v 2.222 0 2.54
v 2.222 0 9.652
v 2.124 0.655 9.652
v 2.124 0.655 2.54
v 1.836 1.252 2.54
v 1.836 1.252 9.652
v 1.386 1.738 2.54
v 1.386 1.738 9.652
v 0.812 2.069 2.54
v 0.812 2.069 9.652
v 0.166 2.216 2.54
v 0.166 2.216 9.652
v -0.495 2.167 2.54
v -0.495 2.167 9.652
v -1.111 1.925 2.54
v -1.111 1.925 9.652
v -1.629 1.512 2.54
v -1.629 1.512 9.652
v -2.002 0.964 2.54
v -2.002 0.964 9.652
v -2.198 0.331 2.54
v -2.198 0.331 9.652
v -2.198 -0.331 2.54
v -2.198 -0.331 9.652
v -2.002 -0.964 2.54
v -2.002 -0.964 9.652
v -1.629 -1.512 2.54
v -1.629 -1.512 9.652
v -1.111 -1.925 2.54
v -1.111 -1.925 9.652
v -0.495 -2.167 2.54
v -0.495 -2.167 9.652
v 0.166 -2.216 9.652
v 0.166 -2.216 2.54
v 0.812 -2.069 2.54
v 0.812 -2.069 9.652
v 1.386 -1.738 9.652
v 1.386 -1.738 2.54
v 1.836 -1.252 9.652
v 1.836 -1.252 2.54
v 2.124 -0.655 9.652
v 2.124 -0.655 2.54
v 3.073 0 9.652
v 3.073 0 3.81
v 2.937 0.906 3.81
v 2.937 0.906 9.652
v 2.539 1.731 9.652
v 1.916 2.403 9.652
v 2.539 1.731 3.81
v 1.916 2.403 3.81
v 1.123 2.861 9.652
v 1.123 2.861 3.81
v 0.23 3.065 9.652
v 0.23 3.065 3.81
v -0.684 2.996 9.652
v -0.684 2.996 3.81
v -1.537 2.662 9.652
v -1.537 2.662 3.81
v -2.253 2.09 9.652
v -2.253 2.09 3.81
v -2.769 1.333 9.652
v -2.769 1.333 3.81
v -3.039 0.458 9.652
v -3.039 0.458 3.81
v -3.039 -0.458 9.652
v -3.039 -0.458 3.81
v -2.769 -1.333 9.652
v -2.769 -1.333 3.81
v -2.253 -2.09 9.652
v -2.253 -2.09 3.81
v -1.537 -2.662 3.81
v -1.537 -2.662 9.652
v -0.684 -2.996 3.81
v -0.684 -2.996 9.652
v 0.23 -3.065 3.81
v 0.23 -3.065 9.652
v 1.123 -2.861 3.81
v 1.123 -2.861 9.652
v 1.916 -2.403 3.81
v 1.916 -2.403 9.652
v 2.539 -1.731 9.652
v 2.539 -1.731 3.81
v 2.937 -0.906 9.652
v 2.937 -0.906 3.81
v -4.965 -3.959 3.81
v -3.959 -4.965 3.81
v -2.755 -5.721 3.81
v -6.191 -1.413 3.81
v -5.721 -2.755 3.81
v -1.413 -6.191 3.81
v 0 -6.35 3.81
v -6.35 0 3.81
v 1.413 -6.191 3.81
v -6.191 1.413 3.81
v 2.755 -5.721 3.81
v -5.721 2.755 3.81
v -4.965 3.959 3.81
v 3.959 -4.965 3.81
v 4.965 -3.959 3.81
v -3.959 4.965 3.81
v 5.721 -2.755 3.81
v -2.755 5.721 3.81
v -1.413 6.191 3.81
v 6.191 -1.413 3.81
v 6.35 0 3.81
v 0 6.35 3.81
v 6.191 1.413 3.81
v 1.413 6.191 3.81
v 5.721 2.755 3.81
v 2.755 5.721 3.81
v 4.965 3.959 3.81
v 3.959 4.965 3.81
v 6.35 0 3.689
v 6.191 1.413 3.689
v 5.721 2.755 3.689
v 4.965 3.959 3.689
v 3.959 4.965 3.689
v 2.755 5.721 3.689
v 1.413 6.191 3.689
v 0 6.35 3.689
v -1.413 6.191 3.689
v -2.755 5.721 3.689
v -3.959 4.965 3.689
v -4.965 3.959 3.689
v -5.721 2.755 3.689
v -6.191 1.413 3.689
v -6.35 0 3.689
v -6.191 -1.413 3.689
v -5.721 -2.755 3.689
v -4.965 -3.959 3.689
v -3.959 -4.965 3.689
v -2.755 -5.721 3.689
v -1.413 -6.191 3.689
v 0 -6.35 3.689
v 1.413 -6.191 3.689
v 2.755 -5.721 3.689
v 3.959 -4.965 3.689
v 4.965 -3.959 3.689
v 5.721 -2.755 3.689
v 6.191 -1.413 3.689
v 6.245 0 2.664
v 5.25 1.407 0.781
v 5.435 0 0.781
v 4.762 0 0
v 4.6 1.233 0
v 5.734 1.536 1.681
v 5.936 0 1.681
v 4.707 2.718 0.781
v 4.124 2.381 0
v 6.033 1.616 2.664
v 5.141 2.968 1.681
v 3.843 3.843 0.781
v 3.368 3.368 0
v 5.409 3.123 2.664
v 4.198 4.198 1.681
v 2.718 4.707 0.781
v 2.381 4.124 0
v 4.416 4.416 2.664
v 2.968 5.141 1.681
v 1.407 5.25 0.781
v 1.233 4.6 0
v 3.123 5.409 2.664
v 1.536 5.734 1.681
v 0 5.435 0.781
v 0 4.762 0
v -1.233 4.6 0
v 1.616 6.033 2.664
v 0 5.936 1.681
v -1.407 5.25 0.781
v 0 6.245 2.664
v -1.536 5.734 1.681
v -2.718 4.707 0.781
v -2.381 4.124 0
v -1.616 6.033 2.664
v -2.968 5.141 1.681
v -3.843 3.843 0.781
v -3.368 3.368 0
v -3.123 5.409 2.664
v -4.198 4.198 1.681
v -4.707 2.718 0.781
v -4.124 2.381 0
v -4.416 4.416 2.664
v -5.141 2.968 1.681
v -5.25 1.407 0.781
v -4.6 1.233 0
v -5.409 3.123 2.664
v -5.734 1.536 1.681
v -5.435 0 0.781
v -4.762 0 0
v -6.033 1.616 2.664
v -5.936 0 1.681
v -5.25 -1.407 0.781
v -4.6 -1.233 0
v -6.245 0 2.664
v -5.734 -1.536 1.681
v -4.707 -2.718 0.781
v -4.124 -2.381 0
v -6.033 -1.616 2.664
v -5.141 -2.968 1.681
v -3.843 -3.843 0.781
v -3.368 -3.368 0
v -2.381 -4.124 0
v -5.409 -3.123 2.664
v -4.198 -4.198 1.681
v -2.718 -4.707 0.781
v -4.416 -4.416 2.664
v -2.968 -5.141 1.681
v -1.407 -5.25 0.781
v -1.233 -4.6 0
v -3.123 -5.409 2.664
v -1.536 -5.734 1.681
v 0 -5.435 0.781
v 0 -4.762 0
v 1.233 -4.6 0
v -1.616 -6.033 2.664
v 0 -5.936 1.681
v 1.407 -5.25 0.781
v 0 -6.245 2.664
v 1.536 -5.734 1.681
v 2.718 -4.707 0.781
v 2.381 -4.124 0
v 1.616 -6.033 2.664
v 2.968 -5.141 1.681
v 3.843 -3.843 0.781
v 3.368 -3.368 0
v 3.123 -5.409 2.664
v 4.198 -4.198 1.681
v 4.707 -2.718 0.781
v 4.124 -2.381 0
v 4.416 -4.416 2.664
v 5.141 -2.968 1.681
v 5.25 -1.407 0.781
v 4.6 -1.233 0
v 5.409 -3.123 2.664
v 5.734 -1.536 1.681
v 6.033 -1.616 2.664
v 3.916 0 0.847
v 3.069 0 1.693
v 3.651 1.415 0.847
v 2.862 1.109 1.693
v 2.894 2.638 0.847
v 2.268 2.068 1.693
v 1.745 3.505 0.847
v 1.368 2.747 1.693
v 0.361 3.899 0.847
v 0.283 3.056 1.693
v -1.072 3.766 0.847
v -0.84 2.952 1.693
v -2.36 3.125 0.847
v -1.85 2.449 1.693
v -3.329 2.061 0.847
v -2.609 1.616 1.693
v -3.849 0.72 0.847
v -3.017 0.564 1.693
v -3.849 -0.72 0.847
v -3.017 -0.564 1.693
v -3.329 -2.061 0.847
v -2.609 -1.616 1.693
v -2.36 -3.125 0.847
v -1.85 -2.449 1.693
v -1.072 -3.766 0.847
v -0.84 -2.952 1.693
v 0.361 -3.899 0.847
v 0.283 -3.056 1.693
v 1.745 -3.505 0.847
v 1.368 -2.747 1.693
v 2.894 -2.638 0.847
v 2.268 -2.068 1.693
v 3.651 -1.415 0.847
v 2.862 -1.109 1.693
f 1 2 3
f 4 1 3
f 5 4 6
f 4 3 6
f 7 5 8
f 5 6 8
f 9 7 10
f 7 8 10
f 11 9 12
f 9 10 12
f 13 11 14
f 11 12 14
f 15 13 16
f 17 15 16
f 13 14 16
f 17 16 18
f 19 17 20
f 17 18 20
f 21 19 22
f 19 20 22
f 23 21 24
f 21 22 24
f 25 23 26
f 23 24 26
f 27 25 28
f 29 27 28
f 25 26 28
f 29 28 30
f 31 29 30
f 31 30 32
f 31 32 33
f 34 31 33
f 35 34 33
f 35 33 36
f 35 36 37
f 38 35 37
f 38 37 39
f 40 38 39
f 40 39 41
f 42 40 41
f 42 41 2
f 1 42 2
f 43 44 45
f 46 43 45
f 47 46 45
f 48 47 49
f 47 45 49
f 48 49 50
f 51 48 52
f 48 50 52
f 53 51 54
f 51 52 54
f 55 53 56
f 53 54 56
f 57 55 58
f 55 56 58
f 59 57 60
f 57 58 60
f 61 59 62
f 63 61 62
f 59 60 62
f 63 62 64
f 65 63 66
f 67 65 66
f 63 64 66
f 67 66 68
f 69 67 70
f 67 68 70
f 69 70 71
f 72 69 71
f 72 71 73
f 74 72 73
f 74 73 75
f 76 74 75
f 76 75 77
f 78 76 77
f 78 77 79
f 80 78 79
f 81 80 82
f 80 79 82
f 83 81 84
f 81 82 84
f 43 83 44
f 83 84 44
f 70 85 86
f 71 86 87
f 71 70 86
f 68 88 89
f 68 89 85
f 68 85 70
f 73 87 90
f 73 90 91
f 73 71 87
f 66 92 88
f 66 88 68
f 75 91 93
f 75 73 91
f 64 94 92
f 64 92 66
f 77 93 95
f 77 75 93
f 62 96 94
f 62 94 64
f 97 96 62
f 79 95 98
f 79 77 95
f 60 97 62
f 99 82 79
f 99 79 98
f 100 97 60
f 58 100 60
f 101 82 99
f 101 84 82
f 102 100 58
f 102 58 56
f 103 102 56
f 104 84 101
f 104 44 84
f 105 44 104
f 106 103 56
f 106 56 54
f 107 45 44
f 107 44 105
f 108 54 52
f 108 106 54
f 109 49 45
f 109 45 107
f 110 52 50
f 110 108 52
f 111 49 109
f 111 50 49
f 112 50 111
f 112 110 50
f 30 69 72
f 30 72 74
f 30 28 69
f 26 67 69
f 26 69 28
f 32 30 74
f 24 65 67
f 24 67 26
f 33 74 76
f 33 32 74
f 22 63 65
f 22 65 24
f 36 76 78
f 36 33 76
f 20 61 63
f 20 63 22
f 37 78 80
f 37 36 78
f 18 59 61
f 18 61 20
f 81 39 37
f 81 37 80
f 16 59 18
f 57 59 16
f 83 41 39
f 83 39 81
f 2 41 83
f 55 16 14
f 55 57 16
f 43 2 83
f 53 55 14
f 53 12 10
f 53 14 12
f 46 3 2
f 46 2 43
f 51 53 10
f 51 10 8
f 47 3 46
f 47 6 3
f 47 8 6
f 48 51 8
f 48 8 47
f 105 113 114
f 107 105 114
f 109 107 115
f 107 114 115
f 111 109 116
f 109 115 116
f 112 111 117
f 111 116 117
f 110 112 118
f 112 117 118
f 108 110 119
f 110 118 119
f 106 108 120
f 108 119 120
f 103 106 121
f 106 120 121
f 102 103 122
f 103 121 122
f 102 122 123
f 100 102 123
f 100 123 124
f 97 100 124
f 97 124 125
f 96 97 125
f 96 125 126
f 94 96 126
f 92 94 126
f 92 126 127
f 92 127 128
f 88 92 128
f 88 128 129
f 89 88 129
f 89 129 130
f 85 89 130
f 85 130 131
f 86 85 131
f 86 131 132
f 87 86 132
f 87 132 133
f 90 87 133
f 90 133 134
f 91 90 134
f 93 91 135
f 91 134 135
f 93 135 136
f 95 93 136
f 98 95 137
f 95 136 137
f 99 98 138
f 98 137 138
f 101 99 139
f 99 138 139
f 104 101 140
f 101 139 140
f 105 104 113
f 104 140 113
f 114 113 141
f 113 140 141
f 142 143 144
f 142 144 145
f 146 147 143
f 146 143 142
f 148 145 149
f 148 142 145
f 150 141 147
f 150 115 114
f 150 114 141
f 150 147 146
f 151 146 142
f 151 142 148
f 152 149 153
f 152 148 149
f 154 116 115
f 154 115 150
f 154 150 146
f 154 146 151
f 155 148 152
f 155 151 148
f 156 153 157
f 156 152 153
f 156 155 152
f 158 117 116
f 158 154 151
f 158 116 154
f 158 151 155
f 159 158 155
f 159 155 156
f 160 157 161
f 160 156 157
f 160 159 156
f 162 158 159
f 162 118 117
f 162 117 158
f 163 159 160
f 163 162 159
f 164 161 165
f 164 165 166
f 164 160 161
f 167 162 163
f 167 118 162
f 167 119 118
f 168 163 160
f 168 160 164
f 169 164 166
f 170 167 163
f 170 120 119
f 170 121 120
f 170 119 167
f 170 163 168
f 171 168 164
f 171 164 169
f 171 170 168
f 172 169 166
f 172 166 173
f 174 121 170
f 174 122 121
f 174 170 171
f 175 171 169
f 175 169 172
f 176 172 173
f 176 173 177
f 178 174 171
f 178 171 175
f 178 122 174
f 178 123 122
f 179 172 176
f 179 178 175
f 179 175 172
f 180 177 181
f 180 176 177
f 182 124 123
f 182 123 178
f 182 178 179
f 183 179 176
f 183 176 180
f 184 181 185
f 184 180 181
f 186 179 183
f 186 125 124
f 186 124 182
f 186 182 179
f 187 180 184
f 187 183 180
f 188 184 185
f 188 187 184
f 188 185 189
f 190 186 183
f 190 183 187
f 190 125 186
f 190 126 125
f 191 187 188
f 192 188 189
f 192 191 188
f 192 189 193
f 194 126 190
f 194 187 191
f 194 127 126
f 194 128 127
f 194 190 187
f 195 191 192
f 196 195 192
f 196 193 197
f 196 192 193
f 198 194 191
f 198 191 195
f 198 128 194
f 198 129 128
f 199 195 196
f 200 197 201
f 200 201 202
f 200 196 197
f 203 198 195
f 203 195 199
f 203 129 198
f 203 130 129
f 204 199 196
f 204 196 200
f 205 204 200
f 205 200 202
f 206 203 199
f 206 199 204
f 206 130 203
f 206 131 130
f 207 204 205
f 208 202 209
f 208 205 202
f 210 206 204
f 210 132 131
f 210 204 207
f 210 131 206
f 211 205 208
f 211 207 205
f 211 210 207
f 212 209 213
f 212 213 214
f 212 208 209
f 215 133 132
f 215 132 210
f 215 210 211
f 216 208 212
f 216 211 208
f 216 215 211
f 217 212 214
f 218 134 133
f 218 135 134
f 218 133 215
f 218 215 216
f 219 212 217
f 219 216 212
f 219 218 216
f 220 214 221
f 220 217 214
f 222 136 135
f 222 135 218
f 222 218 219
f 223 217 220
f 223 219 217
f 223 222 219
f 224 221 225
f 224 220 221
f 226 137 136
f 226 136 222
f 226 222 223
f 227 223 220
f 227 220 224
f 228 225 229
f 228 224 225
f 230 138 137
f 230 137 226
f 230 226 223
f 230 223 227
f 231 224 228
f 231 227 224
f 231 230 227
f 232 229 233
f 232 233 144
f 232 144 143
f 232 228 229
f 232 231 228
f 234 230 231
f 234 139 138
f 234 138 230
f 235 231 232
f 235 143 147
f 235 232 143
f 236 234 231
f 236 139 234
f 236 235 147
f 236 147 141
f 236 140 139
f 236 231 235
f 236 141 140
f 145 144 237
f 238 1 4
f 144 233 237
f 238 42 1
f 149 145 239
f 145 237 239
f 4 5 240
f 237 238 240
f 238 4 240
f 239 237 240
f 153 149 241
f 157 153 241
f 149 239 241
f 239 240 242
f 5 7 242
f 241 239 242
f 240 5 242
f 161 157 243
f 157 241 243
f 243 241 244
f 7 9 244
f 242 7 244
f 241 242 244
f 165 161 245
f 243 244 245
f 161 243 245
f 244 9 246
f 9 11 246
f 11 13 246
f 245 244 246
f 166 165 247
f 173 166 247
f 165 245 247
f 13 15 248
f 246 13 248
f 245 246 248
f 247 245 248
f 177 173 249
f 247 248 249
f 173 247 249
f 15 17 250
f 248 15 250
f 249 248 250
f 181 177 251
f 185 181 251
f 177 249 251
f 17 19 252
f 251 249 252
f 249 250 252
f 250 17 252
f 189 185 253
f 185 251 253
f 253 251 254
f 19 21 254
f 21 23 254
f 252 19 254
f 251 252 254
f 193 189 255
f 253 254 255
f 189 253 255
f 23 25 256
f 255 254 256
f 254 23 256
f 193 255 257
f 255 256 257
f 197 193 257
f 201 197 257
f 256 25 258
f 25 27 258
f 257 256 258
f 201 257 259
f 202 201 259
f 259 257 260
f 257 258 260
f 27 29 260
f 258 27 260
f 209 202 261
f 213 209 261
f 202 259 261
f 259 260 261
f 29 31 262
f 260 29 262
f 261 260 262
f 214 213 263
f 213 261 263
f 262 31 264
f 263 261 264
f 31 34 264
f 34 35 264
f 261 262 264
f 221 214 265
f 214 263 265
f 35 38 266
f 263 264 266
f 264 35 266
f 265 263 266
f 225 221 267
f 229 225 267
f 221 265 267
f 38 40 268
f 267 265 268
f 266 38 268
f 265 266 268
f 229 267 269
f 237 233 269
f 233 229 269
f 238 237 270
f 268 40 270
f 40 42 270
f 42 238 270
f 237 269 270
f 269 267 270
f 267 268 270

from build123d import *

# Parameters (mm, degrees)
F0_R     = 6.35
F1_DEPTH = 3.81
F2_R     = 3.0734
F3_DEPTH = 5.842
F4_R     = 2.2225
F5_DEPTH = 9.653
F6_SIZE2 = 2.54
F6_SIZE  = 2.54


# Not quite as in the source:
# - a fillet or chamfer that OpenCascade refuses, or shapes differently, is made with other operations: its cross-section is extruded or revolved along the edge and cut away or added


with BuildPart() as f1:
    # F0 (on Top) → F1 (new body)
    with BuildSketch(Plane.XY):
        Circle(F0_R)
    extrude(amount=F1_DEPTH)

    # F2 (on face) → F3 (join)
    with BuildSketch(Plane.XY.offset(3.81)):
        Circle(F2_R)
    extrude(amount=F3_DEPTH)

    # F4 (on face) → F5 (cut, through all)
    with BuildSketch(Plane.XY.offset(9.652)):
        Circle(F4_R)
    extrude(amount=-F5_DEPTH, mode=Mode.SUBTRACT)

    # F6
    f6_edges = [f1.edges().sort_by_distance(p)[0] for p in [
        (-2.2225, 0, 0),
    ]]
    chamfer(f6_edges, length=F6_SIZE, length2=F6_SIZE2)

    # F7: fillet of radius 5.08 on 1 edges, made by hand

    # F7_s1 → F7_t2 (revolve, cut)
    with BuildSketch(Plane.XZ):
        with BuildLine():
            ThreePointArc((4.7625, 0), (5.93627796, 1.6809703231), (6.35, 3.6890166373))
            Line((6.35, 3.6890166373), (6.35, 0))
            Line((6.35, 0), (4.7625, 0))
        make_face()
    revolve(axis=Axis((0, 0, 0), (0, 0, 1)), mode=Mode.SUBTRACT)


solid = f1.part
